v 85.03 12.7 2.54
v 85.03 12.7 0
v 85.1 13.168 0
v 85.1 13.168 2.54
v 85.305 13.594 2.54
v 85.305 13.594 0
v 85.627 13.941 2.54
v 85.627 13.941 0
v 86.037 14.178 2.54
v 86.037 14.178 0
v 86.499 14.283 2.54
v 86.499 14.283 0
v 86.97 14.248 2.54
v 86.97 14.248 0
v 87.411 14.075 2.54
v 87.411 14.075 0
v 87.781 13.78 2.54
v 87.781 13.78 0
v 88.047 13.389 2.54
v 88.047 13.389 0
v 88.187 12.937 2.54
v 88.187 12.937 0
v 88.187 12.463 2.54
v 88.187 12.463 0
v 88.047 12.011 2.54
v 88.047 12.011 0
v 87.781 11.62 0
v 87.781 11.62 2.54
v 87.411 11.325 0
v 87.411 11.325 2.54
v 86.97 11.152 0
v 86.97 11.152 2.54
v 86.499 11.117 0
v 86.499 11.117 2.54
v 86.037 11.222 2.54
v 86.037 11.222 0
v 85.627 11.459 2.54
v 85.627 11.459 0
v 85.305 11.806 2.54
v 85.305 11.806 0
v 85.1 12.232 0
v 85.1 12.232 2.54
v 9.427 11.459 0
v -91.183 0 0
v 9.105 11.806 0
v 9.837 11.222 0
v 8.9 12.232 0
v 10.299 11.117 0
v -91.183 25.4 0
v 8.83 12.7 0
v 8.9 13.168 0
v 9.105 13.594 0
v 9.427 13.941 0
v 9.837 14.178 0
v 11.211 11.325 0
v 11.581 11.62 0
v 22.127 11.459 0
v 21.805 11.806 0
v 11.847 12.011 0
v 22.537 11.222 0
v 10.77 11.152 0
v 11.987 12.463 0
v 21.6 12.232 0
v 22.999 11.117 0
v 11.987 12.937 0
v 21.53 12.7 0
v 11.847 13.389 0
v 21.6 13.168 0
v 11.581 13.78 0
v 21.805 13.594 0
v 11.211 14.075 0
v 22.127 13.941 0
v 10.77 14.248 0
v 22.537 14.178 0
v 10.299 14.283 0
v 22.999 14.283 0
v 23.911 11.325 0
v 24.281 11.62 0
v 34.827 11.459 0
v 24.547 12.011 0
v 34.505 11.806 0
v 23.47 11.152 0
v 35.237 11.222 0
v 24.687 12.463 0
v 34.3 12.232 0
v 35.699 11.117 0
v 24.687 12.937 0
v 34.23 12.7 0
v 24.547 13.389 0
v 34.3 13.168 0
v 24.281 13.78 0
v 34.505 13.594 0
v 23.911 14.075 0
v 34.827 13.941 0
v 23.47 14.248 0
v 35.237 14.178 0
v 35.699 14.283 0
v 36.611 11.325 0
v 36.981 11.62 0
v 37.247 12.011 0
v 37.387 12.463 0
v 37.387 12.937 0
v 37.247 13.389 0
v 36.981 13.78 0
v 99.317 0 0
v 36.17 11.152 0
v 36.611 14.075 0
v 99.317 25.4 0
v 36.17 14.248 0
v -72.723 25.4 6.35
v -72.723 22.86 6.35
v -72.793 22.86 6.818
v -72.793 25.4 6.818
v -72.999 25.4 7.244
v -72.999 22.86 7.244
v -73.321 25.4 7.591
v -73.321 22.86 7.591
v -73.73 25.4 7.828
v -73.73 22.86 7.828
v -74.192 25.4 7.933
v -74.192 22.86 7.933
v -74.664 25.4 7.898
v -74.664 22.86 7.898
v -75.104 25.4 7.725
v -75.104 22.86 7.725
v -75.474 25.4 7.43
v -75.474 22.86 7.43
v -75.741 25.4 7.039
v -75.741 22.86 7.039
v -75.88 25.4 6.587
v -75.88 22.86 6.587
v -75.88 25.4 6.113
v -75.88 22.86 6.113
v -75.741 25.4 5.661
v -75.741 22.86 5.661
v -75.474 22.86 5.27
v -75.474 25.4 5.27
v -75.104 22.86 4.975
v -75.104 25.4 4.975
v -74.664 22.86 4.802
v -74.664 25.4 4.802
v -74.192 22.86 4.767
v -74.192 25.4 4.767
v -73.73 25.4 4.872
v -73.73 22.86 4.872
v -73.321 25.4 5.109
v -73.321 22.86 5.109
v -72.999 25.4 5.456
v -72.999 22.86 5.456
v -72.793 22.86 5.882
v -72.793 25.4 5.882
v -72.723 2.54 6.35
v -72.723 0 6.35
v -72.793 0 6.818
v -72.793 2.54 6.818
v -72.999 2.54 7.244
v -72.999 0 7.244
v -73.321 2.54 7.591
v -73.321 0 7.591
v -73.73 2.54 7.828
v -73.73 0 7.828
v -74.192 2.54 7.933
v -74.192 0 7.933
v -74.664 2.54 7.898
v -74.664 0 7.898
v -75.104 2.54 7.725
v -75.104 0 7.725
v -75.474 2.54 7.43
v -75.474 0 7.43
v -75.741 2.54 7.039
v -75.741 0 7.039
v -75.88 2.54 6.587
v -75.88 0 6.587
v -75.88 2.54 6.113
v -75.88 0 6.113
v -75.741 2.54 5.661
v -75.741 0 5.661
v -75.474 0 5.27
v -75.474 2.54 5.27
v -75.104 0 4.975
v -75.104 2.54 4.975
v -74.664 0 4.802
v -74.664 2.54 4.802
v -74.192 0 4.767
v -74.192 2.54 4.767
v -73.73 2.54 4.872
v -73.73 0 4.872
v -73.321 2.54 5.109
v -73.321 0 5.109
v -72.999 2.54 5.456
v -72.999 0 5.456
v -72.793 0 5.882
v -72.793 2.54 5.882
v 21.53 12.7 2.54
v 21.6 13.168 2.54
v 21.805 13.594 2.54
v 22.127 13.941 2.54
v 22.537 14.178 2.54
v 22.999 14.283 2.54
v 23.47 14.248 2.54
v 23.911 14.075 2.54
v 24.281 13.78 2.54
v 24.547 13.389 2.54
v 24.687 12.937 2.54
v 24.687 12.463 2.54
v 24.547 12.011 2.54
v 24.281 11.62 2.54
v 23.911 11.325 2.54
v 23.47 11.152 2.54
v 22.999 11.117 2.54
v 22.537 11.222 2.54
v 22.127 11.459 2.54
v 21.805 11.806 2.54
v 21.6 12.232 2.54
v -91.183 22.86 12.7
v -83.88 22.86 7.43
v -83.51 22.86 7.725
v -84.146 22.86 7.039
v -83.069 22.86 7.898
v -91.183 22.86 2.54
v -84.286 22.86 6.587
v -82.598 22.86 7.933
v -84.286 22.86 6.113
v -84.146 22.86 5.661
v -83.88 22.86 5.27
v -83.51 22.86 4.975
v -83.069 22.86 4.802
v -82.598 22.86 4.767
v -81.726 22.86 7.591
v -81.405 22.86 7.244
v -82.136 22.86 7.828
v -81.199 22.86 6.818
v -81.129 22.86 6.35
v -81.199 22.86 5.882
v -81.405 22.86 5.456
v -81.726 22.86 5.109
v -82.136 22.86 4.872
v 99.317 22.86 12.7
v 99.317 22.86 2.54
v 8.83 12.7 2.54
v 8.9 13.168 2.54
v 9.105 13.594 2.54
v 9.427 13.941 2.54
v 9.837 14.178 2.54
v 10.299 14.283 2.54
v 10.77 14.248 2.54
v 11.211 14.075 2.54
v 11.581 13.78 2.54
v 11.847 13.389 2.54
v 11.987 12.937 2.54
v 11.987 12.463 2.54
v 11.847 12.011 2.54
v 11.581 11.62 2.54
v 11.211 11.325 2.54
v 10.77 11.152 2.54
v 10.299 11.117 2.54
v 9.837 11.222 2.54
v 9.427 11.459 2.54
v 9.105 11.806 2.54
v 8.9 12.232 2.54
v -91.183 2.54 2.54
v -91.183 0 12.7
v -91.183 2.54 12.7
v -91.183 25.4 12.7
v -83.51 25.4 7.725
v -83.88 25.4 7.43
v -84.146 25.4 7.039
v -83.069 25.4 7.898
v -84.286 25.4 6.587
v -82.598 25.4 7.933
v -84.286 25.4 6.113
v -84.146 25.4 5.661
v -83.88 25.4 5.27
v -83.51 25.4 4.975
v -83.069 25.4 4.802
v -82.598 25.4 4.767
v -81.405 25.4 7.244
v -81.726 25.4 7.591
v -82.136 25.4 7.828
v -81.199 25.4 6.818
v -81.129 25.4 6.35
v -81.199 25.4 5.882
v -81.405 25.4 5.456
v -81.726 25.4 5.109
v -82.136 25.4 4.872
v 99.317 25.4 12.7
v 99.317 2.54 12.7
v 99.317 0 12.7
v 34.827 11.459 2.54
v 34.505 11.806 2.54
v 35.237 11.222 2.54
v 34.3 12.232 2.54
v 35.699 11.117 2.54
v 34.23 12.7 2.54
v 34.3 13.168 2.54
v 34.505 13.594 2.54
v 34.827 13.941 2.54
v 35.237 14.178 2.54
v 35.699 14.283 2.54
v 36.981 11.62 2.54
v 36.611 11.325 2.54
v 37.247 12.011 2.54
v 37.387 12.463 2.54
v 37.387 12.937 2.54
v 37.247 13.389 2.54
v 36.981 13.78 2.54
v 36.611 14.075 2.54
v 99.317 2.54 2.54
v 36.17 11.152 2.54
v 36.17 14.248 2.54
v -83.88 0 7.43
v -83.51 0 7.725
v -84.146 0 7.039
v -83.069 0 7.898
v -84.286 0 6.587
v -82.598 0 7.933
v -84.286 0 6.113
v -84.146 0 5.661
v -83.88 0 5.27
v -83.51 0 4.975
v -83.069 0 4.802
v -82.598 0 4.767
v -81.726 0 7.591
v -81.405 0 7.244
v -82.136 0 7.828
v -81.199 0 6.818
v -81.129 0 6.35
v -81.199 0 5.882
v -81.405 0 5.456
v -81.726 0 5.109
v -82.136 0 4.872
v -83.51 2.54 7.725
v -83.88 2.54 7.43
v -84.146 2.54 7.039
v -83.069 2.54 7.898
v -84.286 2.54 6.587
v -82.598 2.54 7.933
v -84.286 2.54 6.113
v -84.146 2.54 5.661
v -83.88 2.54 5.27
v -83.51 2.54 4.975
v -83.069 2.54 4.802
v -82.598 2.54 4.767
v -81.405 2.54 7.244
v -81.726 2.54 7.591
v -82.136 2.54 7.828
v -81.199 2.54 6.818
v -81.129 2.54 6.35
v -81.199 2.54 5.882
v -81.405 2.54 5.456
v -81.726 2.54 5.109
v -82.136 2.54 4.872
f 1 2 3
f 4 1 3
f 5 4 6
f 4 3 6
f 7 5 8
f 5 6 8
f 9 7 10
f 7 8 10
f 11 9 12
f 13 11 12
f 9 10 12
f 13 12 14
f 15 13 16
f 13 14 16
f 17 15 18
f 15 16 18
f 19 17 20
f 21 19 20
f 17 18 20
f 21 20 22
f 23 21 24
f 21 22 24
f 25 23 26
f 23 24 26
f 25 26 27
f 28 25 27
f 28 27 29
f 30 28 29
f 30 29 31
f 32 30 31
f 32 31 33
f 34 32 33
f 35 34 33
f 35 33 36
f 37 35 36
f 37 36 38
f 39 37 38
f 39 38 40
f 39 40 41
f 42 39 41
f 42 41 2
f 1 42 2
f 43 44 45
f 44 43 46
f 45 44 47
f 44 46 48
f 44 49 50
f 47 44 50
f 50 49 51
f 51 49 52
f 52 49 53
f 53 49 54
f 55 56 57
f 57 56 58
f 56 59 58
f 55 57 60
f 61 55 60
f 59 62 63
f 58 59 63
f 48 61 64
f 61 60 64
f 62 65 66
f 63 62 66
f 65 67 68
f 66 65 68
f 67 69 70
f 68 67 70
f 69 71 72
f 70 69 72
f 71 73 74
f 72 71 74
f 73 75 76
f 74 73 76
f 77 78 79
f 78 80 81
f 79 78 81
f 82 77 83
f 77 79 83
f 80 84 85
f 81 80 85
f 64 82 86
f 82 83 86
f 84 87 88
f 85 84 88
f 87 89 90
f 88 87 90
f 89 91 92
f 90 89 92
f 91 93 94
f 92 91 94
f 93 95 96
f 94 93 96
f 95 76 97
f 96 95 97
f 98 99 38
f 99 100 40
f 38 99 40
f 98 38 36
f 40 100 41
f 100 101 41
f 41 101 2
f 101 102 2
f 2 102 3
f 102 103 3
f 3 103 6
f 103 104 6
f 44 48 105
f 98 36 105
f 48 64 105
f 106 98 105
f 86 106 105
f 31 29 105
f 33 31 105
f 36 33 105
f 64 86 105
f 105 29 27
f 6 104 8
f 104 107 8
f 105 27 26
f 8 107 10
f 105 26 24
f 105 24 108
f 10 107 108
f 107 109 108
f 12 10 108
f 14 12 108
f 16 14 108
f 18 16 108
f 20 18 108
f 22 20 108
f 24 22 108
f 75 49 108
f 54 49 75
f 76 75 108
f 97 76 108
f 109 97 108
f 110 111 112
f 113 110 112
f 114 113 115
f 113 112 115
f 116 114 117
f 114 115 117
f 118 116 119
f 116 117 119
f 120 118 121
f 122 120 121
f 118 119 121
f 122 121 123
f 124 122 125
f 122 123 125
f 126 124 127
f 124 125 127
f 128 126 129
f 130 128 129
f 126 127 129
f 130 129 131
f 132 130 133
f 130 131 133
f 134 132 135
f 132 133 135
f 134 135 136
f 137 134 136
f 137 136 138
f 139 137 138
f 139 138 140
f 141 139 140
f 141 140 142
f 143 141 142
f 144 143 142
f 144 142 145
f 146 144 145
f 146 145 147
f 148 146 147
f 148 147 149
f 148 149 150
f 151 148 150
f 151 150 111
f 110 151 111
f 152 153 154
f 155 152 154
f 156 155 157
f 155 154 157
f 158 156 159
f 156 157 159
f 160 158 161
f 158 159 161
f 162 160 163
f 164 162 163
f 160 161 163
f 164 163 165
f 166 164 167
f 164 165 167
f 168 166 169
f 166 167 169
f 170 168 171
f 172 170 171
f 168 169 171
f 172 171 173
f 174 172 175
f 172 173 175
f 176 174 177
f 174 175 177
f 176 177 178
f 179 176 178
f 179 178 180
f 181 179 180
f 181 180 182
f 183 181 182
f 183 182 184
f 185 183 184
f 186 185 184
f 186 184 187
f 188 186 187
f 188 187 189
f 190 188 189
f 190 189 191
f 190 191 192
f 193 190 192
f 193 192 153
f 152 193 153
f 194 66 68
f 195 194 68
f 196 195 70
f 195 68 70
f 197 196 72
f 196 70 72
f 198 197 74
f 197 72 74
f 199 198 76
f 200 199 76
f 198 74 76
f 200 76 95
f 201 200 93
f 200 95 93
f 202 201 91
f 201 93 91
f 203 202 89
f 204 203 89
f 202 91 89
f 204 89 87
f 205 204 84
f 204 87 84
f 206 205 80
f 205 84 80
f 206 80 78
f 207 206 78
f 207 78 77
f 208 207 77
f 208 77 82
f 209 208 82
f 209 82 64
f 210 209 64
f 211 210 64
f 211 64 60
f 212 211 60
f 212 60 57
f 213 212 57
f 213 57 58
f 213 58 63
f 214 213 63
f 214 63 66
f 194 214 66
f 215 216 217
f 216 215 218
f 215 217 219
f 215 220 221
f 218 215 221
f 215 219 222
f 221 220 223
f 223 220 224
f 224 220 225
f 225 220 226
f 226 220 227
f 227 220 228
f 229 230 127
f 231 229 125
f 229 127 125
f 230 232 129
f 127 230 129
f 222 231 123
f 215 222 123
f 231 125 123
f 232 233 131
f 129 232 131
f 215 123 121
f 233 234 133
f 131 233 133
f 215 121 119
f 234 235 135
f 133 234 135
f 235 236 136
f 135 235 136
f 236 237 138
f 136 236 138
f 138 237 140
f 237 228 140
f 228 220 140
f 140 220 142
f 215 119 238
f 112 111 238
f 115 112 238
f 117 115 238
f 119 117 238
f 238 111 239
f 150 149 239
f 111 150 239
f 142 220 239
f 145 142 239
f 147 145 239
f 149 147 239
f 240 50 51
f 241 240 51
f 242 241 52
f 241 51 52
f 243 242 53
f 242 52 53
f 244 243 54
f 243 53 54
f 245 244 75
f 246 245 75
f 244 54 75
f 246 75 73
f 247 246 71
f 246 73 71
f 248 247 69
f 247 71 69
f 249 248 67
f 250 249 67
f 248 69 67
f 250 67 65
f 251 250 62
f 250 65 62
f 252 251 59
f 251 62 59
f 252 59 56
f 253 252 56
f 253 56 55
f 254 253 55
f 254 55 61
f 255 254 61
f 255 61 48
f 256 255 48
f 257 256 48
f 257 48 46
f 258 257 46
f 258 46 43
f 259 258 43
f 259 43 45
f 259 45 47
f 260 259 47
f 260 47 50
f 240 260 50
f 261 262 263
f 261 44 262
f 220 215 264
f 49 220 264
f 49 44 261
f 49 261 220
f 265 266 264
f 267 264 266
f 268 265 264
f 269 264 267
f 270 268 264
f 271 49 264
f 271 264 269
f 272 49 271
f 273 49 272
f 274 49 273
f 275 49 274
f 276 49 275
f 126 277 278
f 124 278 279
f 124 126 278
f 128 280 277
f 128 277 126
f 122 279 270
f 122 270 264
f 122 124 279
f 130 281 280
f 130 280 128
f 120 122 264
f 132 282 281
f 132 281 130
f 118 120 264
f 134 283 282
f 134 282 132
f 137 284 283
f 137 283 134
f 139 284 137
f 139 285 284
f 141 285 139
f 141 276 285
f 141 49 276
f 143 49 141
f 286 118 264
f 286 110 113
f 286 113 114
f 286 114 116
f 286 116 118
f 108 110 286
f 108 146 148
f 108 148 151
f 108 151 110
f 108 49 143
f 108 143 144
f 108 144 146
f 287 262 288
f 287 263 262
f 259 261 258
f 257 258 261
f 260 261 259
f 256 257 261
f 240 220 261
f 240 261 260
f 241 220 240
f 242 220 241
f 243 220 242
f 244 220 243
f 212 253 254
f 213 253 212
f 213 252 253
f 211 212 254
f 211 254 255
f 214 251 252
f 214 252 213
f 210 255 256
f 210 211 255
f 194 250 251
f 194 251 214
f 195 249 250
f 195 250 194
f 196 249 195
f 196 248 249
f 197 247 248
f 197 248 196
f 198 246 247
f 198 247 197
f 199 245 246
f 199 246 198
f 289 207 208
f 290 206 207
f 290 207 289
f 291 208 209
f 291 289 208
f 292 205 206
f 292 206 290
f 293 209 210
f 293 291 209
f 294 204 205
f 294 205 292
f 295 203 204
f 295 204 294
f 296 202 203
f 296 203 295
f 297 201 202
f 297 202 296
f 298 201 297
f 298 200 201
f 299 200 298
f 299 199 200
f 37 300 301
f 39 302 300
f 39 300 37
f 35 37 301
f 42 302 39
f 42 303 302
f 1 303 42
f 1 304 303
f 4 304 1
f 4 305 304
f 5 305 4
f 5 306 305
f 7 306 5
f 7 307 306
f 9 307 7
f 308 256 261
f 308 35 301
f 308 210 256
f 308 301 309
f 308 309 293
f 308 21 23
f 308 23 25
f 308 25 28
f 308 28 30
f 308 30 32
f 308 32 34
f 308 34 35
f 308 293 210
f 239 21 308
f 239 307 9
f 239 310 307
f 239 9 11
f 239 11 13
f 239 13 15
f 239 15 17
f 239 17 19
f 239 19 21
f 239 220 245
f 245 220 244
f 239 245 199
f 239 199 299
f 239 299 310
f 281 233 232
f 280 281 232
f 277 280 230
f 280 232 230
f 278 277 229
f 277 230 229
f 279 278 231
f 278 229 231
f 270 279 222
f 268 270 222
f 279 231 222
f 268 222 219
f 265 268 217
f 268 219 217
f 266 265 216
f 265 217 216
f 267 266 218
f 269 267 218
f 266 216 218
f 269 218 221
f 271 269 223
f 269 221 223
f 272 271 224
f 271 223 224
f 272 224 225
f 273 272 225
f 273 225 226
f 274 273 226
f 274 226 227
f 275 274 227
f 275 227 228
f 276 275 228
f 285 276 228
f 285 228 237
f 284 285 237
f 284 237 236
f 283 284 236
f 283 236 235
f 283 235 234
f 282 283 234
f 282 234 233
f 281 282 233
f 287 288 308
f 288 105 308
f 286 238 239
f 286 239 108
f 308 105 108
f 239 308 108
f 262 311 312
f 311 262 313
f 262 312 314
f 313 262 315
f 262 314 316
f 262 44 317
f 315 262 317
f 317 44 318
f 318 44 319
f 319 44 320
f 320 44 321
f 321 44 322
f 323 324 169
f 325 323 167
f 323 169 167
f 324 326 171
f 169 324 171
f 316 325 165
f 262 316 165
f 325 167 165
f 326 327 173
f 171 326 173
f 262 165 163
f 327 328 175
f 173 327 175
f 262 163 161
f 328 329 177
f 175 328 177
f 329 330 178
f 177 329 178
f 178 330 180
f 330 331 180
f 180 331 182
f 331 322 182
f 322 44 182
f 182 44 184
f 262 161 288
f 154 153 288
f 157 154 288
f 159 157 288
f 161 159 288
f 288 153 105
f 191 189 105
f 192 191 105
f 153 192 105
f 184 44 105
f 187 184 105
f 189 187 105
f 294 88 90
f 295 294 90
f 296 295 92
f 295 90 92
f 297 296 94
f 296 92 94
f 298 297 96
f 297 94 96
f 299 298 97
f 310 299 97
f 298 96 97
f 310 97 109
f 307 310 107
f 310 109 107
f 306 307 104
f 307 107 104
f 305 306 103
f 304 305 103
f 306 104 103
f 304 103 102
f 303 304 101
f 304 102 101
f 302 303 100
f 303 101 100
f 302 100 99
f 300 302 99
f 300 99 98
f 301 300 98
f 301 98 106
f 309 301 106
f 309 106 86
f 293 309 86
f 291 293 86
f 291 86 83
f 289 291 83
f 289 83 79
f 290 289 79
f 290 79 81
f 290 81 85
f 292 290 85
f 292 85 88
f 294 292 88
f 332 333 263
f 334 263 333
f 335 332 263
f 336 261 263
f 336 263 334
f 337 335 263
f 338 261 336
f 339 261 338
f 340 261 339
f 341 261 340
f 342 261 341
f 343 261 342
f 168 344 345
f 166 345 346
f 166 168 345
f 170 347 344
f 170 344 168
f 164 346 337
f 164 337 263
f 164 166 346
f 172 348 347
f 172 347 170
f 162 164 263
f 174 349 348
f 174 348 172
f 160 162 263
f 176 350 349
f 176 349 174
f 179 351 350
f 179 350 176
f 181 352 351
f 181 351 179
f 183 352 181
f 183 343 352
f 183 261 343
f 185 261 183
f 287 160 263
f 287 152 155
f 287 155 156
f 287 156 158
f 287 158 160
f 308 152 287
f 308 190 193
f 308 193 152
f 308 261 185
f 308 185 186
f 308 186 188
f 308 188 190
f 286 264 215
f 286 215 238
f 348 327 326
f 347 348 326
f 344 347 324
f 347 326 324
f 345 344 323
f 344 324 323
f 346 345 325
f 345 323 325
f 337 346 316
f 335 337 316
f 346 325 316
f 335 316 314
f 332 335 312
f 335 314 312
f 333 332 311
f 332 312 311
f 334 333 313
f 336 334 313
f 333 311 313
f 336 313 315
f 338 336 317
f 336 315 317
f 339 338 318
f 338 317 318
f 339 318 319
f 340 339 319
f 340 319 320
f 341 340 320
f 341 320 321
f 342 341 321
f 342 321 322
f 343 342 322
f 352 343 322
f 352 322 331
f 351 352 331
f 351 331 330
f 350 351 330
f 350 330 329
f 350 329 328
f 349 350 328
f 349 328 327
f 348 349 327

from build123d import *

# Parameters (mm, degrees)
F0_W     = 190.5
F0_H     = 25.4
F1_DEPTH = 12.7
F2_T     = -2.54
F4_D     = 3.175
F6_D     = 3.175


with BuildPart() as f1:
    # F0 (on Top) → F1 (new body)
    with BuildSketch(Plane.XY):
        with Locations((4.067147, 12.7)):
            Rectangle(F0_W, F0_H)
    extrude(amount=F1_DEPTH)

    # F2
    f2_openings = [f1.faces().sort_by_distance(p)[0] for p in [
        (4.067147, 12.7, 12.7),
        (99.317147, 12.7, 6.35),
        (-91.182853, 12.7, 6.35),
    ]]
    offset(amount=F2_T, openings=f2_openings)

    # F4 (through all)
    with Locations(Plane.XY.offset(2.54)):
        with Locations((10.417147, 12.7), (23.117147, 12.7), (35.817147, 12.7), (86.617147, 12.7)):
            Hole(F4_D / 2)

    # F6 (through all)
    with Locations(Plane(origin=(0, 25.4, 0), x_dir=(-1, 0, 0), z_dir=(0, 1, 0))):
        with Locations((74.310439, 6.35), (82.716187, 6.35)):
            Hole(F6_D / 2)


solid = f1.part
